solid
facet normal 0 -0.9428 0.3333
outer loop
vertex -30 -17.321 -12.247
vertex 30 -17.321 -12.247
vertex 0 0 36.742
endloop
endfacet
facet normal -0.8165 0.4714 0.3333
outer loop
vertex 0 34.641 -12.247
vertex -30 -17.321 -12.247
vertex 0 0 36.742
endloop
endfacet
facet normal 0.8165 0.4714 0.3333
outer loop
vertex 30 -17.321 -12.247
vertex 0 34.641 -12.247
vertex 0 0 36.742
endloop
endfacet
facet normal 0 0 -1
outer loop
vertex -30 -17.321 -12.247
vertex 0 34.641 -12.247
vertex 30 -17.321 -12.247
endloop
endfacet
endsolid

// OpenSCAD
a = 30;

polyhedron(
	points=[[+1,-1/sqrt(3),-1/sqrt(6)],
			[-1,-1/sqrt(3),-1/sqrt(6)],
			[0,2/sqrt(3),-1/sqrt(6)],
			[0,0,3/sqrt(6)] ]*a,
	triangles=[ [3,0,1],[3,1,2],[3,2,0],[0,2,1] ]
);  
